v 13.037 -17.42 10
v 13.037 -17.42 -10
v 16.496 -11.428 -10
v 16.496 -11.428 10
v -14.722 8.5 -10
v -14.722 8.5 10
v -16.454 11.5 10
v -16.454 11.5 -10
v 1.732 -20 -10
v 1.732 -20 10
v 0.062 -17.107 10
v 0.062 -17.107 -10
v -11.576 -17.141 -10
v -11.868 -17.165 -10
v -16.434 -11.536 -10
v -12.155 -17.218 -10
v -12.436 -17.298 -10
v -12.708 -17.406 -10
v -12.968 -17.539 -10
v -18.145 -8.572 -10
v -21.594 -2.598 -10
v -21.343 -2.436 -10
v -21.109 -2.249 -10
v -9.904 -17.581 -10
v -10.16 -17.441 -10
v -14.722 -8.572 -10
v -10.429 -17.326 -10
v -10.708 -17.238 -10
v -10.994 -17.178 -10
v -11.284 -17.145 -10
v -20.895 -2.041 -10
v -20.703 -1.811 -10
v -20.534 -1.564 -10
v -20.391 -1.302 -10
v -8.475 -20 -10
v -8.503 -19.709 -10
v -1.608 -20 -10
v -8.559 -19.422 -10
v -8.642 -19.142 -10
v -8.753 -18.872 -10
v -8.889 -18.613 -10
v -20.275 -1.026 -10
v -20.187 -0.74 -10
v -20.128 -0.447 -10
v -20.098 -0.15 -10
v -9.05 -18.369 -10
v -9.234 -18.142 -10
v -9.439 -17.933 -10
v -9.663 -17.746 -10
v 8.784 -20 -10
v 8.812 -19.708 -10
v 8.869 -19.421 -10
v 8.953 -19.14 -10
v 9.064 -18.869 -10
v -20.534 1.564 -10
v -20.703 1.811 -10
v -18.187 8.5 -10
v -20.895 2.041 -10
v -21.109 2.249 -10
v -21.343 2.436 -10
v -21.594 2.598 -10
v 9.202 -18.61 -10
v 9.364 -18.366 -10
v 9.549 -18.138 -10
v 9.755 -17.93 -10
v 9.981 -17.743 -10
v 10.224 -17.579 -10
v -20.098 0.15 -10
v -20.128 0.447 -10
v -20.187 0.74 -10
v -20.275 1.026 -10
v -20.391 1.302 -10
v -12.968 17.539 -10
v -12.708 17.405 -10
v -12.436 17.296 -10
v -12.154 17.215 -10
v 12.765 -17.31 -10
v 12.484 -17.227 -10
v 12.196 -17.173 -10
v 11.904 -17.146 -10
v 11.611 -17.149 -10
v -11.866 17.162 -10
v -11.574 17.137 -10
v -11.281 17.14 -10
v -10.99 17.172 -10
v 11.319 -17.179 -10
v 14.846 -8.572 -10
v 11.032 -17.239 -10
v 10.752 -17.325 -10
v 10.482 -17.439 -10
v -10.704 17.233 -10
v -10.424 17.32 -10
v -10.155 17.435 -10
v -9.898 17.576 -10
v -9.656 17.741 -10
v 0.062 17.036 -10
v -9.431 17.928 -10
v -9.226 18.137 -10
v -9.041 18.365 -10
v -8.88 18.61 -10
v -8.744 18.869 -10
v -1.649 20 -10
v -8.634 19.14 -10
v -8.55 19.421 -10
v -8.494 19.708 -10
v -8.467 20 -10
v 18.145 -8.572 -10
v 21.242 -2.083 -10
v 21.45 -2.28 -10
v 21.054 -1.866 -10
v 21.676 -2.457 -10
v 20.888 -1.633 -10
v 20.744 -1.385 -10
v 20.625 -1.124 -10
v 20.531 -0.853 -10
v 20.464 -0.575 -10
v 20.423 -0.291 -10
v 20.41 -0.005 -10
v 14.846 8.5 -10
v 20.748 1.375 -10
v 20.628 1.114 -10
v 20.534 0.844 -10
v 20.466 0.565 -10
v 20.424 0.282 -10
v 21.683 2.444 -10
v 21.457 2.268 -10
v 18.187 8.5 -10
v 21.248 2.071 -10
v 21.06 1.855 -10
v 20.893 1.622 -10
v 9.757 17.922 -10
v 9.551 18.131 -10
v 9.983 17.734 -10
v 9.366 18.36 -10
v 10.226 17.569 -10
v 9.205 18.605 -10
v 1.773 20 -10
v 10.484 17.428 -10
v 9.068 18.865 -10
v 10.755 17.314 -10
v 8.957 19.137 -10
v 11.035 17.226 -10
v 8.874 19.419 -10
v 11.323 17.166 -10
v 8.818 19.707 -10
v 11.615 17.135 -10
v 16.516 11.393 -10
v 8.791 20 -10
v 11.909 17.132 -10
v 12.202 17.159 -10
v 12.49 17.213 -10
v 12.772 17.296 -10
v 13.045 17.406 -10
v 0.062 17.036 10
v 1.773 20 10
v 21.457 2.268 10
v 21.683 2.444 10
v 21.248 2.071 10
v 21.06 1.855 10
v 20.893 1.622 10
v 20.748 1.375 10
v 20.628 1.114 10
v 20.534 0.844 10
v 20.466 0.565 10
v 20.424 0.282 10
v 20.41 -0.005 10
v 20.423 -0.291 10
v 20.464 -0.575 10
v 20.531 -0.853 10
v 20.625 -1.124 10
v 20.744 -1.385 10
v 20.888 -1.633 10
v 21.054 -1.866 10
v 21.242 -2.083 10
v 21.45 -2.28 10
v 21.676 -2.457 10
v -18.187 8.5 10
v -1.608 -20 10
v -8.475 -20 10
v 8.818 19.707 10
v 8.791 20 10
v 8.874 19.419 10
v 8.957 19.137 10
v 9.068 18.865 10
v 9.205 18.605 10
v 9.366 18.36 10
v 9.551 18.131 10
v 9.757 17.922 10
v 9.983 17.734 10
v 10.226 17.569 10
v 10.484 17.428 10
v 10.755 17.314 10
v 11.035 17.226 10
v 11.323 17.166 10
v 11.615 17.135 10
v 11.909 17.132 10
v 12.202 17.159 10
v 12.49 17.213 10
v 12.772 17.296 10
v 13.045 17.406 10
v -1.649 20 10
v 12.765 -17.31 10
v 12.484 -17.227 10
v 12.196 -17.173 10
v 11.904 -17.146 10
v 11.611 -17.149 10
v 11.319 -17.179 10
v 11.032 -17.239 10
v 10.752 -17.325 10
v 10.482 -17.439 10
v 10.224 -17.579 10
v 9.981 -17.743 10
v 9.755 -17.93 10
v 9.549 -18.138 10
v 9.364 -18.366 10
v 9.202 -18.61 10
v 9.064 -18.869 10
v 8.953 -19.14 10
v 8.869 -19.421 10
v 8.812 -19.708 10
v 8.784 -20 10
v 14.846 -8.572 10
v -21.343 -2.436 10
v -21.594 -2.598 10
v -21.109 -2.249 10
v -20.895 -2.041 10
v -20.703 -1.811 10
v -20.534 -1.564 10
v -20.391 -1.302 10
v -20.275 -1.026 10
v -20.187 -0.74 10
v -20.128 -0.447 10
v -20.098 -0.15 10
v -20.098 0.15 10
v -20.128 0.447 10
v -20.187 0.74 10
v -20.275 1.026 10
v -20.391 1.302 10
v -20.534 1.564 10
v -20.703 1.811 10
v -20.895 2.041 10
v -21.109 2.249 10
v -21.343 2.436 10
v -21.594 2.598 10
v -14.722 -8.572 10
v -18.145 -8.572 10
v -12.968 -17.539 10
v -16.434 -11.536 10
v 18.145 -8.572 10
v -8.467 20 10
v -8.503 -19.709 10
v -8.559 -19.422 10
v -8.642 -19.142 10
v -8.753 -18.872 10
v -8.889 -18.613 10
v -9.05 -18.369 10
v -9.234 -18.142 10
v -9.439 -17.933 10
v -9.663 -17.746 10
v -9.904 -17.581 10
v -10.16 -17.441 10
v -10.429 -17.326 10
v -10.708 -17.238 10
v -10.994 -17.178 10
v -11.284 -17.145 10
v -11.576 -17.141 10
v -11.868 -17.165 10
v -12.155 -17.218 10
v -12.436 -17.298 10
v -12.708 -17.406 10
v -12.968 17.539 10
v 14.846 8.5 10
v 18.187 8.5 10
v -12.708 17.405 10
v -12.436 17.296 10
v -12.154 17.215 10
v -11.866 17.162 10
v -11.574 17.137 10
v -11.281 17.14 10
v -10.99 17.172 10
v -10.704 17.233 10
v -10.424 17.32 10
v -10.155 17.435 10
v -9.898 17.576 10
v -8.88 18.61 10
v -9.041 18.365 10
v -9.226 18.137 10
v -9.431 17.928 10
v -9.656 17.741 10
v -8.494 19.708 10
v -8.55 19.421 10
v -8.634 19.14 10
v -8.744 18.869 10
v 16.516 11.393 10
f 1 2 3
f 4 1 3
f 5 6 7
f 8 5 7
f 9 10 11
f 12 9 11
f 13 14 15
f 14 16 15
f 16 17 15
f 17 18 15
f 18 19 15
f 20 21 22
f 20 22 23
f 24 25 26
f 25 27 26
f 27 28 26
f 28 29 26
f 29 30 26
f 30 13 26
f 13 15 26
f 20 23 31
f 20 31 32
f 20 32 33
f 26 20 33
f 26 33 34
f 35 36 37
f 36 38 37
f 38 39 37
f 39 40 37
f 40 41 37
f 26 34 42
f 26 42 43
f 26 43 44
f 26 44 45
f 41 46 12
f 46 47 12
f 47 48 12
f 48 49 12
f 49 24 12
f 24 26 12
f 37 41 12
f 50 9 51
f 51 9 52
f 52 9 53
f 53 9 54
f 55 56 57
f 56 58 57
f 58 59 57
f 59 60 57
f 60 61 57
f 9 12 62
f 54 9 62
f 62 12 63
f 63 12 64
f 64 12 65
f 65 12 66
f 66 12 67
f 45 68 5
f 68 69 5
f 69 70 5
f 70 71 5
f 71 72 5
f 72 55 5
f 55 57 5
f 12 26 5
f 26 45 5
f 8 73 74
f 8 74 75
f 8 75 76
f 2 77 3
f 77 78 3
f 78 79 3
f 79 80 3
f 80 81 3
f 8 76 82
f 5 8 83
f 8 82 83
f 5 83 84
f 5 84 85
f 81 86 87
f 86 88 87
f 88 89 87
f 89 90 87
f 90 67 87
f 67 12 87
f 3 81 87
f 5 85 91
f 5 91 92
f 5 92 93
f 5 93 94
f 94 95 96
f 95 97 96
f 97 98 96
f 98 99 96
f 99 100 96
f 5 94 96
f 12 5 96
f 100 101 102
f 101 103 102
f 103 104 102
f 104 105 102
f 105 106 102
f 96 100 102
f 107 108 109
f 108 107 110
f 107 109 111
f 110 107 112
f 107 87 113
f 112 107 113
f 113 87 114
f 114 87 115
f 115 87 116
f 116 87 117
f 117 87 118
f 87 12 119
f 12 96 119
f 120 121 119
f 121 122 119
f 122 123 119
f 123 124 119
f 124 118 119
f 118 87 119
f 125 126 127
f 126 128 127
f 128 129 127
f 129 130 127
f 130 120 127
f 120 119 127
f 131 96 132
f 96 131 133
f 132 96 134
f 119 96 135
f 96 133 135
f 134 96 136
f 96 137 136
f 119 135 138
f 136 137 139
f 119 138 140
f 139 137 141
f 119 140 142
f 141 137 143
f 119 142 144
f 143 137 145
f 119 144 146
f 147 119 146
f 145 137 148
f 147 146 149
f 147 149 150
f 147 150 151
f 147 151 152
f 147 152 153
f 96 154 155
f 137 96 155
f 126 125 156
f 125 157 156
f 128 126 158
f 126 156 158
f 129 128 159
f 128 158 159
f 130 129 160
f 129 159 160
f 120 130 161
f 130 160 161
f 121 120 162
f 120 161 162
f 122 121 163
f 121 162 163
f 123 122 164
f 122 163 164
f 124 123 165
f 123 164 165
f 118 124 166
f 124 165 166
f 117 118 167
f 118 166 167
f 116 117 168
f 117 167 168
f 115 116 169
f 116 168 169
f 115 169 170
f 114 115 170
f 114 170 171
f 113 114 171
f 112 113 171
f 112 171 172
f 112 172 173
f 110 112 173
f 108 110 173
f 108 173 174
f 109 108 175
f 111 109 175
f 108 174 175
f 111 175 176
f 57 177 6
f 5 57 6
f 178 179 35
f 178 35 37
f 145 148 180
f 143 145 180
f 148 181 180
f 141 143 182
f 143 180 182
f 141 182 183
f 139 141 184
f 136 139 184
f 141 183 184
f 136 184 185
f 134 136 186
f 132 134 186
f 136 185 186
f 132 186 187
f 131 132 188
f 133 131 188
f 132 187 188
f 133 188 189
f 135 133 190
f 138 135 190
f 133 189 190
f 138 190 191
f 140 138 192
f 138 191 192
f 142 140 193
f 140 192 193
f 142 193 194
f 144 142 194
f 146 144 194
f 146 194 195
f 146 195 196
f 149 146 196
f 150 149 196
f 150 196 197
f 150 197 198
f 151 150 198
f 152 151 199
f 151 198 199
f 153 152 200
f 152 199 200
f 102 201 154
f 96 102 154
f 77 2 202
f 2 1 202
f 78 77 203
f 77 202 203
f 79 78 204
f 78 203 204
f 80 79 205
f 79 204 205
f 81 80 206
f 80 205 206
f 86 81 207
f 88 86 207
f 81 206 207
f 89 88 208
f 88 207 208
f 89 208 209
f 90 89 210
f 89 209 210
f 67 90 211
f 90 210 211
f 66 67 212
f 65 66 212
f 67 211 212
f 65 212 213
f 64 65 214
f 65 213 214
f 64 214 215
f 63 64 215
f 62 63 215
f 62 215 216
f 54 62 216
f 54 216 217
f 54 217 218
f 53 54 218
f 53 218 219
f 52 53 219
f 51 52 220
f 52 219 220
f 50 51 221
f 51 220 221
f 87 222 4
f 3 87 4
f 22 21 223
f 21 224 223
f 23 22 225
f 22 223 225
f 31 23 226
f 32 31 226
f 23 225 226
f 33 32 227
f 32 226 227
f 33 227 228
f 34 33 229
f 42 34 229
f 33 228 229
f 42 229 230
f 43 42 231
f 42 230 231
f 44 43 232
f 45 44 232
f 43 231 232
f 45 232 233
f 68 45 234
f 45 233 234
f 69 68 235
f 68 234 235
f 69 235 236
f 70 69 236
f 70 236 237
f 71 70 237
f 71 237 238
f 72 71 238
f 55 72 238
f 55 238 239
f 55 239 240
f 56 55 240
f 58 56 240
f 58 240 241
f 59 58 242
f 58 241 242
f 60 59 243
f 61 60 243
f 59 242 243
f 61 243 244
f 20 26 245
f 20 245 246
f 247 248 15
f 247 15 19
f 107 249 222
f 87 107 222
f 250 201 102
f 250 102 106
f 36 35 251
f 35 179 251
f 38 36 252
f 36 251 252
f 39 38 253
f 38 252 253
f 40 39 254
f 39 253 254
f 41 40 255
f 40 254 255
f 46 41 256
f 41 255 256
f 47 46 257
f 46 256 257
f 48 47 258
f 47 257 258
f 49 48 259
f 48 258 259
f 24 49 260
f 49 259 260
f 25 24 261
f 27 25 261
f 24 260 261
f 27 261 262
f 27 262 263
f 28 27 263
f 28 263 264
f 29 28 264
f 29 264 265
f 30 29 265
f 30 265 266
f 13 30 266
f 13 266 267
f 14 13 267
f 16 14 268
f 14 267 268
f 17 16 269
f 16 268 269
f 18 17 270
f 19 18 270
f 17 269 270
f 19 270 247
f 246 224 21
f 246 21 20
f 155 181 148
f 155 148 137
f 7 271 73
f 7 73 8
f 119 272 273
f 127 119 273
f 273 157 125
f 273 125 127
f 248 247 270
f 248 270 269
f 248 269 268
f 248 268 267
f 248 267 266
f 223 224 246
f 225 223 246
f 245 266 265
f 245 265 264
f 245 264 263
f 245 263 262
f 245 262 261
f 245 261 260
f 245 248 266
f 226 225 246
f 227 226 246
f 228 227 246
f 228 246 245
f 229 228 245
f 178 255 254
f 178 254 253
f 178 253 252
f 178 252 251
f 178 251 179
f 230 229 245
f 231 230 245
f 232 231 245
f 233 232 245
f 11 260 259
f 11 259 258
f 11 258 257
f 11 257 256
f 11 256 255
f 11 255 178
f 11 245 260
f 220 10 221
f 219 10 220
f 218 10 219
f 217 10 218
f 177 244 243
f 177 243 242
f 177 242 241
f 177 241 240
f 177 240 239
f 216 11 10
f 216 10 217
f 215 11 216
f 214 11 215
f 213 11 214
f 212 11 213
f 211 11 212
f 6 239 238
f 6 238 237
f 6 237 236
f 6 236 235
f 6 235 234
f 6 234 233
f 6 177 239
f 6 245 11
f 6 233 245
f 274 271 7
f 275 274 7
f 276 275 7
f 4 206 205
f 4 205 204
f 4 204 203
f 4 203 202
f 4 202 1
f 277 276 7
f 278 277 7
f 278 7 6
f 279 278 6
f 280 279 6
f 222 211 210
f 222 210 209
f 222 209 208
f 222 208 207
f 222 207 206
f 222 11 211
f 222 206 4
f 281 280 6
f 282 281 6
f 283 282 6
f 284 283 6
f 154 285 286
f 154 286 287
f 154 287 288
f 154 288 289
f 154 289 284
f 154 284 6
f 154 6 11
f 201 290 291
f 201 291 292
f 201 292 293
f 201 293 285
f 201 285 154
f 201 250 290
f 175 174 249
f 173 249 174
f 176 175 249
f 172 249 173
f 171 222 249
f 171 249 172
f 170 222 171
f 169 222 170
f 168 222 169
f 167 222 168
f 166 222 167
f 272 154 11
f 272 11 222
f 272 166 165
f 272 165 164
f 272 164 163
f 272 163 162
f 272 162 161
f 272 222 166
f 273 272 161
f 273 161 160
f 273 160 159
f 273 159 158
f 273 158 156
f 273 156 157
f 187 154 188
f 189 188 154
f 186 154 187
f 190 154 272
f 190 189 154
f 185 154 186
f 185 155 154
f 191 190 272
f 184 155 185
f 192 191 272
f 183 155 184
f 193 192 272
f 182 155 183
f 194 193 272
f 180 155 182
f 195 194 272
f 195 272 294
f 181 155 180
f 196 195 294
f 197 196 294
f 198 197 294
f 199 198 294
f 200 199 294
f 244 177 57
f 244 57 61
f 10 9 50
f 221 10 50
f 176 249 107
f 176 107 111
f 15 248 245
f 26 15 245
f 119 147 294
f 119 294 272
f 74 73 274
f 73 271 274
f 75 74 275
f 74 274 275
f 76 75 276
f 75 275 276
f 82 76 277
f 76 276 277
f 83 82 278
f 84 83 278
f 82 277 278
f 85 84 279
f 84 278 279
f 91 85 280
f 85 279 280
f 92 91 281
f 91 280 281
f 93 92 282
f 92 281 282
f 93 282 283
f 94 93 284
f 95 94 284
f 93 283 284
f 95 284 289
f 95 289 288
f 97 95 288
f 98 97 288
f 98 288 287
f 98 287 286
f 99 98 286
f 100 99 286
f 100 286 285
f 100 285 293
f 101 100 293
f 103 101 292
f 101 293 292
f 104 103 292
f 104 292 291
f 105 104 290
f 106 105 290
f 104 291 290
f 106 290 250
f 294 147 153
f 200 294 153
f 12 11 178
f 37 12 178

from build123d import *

# Parameters (mm, degrees)
EXTRUDE_1_DEPTH          = 10
CUT_EXTRUDE_1_DEPTH      = 20
PATTERN_CIRCULAR_1_COUNT = 6
SKETCH_3_R               = 3
CUT_EXTRUDE_2_DEPTH      = 20
PATTERN_CIRCULAR_2_COUNT = 6


with BuildPart() as part:
    # 草图1 → 凸台-拉伸1 (new, symmetric)
    with BuildSketch(Plane.XY):
        Polygon((23.094010768, 0), (11.547005384, 20), (-11.547005384, 20), (-23.094010768, 0), (-11.547005384, -20), (11.547005384, -20), align=None)
    extrude(amount=EXTRUDE_1_DEPTH, both=True)

    # 草图2 → 切除-拉伸1 (cut)
    with BuildSketch(Plane.XY.offset(10)):
        Polygon((-14.722431864, 8.5), (-17.320508076, 13), (-19.918584287, 8.5), align=None)
    cut_extrude_1 = extrude(amount=-CUT_EXTRUDE_1_DEPTH, mode=Mode.SUBTRACT)

    # 阵列(圆周)1: 切除-拉伸1 ×6 about axis
    pattern_circular_1_axis = Axis((0.061936572, -0.035759097, 0), (0, 0, 1))
    for i in range(1, PATTERN_CIRCULAR_1_COUNT):
        add(cut_extrude_1.rotate(pattern_circular_1_axis, i * 360 / PATTERN_CIRCULAR_1_COUNT), mode=Mode.SUBTRACT)

    # 草图3 → 切除-拉伸2 (cut)
    with BuildSketch(Plane.XY.offset(10)):
        with Locations((-23.094010768, 0)):
            Circle(SKETCH_3_R)
    cut_extrude_2 = extrude(amount=-CUT_EXTRUDE_2_DEPTH, mode=Mode.SUBTRACT)

    # 阵列(圆周)2: 切除-拉伸2 ×6 about axis
    pattern_circular_2_axis = Axis((0.158034709, -0.00459912, 0), (0, 0, 1))
    for i in range(1, PATTERN_CIRCULAR_2_COUNT):
        add(cut_extrude_2.rotate(pattern_circular_2_axis, i * 360 / PATTERN_CIRCULAR_2_COUNT), mode=Mode.SUBTRACT)


solid = part.part
